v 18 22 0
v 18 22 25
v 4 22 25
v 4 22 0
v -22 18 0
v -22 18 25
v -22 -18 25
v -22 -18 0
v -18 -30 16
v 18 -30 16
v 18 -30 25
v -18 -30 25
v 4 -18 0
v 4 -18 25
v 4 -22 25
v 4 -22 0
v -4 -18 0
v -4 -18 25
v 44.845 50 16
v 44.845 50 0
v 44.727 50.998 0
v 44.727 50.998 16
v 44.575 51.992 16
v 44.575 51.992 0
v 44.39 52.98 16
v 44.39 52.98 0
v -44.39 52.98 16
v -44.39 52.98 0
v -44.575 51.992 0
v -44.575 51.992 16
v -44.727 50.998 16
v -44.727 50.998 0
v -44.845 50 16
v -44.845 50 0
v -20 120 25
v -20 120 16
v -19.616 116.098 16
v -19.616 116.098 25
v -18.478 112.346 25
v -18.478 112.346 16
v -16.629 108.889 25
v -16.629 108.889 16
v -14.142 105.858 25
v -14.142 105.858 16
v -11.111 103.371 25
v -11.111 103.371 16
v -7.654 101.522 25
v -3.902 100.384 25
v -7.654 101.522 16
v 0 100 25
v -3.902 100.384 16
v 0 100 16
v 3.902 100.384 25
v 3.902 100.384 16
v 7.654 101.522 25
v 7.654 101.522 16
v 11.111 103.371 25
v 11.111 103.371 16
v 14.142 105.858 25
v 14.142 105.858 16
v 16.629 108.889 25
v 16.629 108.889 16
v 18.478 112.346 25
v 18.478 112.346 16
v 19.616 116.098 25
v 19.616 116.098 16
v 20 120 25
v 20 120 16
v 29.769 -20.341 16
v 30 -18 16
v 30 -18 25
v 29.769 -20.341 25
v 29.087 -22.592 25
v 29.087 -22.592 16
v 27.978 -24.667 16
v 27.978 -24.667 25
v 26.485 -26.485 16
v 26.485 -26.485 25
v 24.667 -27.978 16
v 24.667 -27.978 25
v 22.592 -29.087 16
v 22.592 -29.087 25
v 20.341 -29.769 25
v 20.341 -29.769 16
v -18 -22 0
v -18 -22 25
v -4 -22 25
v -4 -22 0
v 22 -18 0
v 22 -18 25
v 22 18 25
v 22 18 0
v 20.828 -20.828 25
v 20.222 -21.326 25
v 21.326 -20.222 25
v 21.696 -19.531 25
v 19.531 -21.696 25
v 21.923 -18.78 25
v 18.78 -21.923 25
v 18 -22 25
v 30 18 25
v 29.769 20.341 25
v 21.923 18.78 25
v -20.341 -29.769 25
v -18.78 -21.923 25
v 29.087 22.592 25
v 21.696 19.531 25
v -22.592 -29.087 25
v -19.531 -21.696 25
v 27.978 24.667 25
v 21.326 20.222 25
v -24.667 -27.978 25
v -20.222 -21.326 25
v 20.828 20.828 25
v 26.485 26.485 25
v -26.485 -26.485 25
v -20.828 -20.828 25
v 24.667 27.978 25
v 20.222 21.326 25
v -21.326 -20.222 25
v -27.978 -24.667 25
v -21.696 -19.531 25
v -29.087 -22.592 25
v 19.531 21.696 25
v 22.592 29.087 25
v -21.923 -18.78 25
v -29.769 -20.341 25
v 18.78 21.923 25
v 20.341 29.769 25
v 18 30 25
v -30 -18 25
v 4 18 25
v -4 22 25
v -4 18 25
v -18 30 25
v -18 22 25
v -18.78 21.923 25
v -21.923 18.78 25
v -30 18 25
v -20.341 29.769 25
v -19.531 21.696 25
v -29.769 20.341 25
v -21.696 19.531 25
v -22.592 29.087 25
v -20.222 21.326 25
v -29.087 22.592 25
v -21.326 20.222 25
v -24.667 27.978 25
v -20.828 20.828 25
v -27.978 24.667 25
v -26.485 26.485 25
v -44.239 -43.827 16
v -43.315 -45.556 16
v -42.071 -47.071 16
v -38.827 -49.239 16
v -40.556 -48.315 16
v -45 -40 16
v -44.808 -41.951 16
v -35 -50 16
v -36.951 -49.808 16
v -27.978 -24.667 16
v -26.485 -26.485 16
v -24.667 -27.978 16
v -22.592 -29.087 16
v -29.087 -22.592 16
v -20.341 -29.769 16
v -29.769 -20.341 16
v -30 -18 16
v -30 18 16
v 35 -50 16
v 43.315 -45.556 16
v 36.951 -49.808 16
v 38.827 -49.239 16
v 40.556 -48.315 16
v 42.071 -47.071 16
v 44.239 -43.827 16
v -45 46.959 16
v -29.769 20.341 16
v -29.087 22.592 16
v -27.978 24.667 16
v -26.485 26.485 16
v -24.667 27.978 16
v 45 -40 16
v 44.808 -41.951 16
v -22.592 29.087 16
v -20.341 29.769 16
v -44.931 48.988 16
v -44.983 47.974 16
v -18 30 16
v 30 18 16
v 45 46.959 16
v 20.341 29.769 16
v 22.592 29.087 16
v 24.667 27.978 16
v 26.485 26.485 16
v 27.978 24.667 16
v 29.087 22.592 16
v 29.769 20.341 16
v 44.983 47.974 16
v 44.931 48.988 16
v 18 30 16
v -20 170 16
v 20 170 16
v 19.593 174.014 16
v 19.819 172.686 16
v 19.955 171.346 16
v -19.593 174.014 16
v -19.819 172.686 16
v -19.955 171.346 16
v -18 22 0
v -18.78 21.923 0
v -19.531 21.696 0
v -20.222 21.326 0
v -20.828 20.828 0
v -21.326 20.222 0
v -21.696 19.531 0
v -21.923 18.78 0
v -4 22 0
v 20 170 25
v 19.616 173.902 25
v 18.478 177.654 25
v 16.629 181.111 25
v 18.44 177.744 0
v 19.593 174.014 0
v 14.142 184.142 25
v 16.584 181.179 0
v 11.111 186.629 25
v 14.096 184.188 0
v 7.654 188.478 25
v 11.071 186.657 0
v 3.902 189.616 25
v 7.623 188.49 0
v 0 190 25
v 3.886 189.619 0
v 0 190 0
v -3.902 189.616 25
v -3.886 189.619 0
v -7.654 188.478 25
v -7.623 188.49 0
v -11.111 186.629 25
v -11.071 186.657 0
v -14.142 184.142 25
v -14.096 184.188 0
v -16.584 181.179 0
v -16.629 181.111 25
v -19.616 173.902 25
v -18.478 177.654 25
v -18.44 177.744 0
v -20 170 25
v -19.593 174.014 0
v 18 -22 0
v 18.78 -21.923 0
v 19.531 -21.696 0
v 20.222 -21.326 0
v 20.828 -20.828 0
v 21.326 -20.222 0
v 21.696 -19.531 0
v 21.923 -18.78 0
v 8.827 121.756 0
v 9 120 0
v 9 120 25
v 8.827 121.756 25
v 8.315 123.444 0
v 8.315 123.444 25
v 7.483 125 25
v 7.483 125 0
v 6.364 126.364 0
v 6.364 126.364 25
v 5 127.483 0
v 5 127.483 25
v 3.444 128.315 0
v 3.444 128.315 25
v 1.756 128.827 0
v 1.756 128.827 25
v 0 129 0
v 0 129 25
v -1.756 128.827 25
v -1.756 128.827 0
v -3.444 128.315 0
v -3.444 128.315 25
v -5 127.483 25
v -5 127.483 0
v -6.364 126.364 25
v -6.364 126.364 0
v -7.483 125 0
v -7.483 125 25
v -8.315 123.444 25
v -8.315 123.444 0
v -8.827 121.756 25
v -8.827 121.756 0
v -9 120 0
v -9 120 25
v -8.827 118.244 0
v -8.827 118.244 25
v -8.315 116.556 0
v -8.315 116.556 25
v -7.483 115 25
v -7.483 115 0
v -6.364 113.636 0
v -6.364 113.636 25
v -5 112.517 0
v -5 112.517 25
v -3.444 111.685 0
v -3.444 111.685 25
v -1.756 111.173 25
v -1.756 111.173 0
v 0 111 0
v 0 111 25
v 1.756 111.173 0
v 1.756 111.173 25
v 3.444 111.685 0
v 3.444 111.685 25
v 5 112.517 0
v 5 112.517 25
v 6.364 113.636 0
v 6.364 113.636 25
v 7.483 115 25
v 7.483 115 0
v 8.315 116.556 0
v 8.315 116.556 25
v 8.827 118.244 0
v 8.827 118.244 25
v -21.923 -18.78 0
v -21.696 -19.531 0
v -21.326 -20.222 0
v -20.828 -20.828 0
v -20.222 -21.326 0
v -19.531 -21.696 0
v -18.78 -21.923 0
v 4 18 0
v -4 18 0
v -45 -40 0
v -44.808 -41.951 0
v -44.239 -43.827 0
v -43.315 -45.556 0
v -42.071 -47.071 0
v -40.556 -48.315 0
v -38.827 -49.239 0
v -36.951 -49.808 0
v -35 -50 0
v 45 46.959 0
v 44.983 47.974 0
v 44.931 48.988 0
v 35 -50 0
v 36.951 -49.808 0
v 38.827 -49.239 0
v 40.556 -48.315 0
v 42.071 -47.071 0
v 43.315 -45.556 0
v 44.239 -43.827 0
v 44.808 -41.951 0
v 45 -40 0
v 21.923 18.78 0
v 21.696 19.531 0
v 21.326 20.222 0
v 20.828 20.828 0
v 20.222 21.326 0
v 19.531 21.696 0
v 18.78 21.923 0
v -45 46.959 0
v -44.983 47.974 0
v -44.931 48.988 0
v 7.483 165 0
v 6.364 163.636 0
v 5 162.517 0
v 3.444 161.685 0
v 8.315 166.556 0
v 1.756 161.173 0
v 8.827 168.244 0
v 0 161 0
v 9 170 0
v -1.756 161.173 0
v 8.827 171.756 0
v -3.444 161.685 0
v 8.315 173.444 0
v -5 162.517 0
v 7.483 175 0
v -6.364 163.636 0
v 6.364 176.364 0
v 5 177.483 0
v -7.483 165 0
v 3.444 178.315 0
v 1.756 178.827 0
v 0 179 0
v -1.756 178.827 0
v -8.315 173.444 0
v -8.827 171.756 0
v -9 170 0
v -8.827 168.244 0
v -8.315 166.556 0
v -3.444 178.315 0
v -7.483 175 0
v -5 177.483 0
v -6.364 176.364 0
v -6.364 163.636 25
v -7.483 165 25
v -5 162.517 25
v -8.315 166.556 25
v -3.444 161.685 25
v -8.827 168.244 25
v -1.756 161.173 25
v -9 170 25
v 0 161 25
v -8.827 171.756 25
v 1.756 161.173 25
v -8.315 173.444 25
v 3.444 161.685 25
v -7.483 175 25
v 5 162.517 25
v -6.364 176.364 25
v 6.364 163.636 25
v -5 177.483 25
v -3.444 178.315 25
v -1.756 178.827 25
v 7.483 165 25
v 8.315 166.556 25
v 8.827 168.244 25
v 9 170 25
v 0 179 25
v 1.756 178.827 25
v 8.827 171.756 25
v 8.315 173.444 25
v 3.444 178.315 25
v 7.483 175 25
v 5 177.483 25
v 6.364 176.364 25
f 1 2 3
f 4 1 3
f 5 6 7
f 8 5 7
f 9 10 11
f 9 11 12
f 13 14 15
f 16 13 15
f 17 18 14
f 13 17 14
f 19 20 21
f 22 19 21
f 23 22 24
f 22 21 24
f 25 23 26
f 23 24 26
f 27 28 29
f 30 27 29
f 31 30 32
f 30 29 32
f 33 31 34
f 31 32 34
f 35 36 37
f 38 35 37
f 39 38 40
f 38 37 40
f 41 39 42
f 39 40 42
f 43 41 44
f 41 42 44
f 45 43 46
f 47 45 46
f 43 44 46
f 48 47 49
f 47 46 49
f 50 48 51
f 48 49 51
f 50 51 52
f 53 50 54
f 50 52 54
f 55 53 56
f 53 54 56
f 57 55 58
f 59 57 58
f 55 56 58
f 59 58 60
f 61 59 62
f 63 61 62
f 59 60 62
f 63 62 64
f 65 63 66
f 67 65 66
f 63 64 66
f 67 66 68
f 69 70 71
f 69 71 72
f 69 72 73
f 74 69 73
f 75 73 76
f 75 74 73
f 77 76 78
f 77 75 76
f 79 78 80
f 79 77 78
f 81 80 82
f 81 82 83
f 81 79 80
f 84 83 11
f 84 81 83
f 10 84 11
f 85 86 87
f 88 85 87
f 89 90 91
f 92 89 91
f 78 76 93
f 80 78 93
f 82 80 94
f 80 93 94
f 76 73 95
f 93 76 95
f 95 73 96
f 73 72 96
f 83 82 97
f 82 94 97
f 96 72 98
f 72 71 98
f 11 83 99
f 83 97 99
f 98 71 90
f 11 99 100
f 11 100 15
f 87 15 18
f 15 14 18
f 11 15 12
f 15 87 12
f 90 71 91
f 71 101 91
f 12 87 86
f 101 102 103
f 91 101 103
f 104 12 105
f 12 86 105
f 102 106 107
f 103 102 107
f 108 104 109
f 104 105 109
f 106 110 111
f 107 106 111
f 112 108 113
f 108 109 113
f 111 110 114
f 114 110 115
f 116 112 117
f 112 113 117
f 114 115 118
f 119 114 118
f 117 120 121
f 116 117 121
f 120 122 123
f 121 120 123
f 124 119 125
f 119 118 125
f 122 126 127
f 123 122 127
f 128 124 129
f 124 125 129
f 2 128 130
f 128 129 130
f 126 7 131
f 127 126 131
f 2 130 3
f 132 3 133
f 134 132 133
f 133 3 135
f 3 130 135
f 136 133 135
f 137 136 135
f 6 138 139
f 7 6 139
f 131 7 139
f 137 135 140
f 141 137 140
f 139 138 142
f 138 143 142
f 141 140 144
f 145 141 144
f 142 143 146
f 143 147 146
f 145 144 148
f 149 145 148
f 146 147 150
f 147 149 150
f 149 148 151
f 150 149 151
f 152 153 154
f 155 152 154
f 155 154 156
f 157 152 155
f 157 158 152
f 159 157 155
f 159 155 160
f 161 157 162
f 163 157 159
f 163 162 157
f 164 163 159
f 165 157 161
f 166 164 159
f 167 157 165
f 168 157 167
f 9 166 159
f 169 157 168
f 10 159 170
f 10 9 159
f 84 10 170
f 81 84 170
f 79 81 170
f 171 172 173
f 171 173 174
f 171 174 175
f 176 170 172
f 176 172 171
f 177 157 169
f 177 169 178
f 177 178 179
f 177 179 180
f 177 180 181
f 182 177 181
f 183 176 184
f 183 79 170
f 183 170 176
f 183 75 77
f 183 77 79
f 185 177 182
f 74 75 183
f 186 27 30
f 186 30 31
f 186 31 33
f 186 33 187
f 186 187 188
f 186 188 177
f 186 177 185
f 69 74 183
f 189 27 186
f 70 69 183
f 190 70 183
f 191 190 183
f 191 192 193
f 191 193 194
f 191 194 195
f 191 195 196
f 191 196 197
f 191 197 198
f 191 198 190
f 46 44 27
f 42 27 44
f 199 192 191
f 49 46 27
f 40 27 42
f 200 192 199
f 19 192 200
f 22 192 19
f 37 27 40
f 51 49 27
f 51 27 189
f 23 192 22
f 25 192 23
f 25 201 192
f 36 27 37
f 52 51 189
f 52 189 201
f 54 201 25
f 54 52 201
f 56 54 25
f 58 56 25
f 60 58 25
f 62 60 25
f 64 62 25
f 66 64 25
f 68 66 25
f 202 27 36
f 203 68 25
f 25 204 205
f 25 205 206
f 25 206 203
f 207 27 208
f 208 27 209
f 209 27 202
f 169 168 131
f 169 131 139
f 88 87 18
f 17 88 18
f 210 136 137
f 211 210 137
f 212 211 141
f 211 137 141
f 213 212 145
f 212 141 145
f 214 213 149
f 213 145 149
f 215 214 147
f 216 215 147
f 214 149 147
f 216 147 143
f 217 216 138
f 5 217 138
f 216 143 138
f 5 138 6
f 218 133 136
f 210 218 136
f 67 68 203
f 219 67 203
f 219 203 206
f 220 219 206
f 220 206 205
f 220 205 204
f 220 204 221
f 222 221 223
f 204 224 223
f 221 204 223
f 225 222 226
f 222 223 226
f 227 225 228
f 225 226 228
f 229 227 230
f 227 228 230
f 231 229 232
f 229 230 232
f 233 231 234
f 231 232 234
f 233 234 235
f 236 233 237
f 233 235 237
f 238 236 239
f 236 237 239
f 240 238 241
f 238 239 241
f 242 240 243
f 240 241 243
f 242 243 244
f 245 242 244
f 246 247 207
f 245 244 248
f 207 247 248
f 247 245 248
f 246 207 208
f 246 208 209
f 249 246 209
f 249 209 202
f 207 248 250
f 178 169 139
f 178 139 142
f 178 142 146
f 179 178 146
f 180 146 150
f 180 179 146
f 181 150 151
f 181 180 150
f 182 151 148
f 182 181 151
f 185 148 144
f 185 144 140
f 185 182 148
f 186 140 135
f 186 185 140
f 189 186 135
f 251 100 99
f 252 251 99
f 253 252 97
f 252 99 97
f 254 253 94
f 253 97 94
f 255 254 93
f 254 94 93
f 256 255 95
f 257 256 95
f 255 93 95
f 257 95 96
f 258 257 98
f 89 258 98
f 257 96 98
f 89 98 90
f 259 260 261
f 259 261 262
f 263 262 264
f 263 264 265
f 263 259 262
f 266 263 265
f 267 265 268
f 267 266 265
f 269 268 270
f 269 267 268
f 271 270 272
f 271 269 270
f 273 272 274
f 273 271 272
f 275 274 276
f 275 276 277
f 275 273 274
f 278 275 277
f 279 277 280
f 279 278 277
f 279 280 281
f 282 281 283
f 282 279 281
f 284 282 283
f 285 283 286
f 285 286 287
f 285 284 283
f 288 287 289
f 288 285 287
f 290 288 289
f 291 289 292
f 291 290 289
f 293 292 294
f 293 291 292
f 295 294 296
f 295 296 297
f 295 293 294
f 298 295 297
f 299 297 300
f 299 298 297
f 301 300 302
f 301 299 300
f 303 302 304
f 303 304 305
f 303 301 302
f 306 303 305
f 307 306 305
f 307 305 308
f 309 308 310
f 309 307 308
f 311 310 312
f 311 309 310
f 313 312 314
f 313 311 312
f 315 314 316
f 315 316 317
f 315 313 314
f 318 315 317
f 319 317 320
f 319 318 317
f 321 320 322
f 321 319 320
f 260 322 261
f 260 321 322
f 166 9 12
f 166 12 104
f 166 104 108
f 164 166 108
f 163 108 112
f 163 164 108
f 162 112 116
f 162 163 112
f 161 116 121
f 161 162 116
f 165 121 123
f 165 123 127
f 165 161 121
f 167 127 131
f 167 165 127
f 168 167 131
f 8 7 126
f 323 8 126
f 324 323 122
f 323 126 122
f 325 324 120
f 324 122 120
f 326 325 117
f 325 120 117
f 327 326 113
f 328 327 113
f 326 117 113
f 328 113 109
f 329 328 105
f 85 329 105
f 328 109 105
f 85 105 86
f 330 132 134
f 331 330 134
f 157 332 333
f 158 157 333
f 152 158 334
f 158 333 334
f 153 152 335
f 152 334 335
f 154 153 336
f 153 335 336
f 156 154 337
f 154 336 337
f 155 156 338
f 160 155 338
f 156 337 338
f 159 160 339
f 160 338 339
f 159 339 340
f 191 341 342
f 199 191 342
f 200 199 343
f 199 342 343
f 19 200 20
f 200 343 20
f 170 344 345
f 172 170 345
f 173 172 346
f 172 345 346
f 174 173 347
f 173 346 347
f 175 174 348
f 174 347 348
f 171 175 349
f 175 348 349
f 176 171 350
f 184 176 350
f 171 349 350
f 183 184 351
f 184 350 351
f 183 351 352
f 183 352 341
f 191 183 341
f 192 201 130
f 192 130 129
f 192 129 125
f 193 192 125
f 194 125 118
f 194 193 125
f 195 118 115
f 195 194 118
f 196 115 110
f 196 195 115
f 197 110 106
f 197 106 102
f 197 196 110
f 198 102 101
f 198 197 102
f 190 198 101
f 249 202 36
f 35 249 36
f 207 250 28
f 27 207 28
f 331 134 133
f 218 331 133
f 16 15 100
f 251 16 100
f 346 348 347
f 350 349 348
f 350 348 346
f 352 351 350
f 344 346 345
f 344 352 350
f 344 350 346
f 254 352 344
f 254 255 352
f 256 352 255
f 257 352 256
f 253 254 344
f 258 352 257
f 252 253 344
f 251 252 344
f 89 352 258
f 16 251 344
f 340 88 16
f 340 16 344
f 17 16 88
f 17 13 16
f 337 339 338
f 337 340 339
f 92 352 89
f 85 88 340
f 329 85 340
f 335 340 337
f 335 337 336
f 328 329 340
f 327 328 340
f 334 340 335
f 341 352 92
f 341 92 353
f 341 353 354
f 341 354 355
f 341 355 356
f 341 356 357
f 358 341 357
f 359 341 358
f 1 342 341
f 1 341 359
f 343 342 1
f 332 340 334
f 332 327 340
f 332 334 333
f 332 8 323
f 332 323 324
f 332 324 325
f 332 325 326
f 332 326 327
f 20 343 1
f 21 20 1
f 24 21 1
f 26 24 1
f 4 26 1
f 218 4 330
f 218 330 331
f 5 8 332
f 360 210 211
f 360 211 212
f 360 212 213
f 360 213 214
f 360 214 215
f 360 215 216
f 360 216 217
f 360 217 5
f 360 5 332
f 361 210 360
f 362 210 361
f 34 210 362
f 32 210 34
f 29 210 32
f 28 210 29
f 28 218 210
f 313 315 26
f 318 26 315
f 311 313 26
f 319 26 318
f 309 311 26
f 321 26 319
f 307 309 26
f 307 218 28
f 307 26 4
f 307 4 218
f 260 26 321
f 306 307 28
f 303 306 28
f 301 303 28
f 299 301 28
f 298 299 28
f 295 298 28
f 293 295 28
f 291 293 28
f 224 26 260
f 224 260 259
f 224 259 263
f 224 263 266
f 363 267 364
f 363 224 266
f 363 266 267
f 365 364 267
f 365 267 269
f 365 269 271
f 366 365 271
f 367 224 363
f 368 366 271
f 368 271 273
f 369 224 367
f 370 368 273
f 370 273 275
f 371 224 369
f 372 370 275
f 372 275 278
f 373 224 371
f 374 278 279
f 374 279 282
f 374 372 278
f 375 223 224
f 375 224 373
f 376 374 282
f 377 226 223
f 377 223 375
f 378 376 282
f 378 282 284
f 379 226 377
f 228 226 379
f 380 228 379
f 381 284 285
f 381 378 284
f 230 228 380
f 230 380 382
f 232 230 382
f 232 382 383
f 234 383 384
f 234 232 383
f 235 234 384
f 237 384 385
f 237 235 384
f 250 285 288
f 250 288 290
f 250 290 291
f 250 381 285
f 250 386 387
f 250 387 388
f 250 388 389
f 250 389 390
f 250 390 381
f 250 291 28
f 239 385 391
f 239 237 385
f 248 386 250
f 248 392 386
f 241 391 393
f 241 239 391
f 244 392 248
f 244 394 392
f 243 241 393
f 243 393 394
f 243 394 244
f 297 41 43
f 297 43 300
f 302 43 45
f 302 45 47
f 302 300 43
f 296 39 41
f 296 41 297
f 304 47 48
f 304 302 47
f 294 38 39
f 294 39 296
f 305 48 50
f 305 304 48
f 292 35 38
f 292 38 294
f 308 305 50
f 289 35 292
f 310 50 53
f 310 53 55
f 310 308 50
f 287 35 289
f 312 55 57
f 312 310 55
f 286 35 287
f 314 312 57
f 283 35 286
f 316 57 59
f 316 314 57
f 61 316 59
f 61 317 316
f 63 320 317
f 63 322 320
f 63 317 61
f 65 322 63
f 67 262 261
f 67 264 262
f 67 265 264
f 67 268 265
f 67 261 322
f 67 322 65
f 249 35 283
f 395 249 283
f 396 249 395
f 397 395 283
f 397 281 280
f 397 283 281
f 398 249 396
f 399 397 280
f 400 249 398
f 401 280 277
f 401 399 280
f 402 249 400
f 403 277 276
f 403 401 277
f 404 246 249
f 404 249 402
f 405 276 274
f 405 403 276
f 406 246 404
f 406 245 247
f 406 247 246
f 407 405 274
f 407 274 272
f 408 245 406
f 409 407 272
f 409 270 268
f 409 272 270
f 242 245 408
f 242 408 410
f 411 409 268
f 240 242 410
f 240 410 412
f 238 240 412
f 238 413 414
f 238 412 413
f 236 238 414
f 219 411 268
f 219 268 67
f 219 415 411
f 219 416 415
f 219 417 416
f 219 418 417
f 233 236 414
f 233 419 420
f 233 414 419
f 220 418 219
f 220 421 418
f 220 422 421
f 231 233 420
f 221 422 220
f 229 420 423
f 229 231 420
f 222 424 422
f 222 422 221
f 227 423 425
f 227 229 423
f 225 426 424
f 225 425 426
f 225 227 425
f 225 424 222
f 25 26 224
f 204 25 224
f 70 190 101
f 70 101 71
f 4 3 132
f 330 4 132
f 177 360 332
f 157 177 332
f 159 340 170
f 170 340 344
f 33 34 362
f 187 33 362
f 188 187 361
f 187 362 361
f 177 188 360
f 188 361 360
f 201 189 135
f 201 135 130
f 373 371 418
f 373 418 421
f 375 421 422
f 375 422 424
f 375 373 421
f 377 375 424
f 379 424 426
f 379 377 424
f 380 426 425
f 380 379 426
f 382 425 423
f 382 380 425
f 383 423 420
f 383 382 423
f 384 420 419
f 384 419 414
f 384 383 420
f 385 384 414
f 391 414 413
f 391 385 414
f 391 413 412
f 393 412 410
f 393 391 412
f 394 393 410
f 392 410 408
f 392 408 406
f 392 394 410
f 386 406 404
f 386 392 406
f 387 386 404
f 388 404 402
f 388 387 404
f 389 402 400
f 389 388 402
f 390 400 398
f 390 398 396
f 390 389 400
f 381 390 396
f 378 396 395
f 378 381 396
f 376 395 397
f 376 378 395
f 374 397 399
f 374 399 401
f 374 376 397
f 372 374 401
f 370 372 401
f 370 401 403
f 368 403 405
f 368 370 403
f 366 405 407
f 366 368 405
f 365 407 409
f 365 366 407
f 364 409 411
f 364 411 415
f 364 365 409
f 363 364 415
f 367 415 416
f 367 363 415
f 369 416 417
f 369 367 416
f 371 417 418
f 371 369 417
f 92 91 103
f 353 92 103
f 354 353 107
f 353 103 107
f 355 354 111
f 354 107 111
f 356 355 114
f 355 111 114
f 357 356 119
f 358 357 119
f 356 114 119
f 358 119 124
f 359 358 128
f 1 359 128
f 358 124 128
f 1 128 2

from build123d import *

# Parameters (mm, degrees)
EXTRUDE_1_DEPTH     = 16
SKETCH_1_3_R        = 9
EXTRUDE_2_DEPTH     = 25
EXTRUDE_3_DEPTH     = 25
CUT_EXTRUDE_1_DEPTH = 25


with BuildPart() as part:
    # 草图1 → 凸台-拉伸1 (new body)
    with BuildSketch(Plane.XY):
        with BuildLine():
            Line((-35, -50), (35, -50))
            ThreePointArc((35, -50), (42.071067812, -47.071067812), (45, -40))
            Line((45, -40), (45, 46.958512764))
            ThreePointArc((45, 46.958512764), (44.847001034, 49.98448852), (44.389564715, 52.979599532))
            Line((44.389564715, 52.979599532), (19.593043195, 174.014057595))
            ThreePointArc((19.593043195, 174.014057595), (19.898000702, 172.017317043), (20, 170))
            Line((20, 170), (20, 120))
            ThreePointArc((20, 120), (0, 100), (-20, 120))
            Line((-20, 120), (-20, 170))
            ThreePointArc((-20, 170), (-19.898000688, 172.017317185), (-19.593043138, 174.014057873))
            Line((-19.593043138, 174.014057873), (-44.389564715, 52.979599532))
            ThreePointArc((-44.389564715, 52.979599532), (-44.847001034, 49.98448852), (-45, 46.958512764))
            Line((-45, 46.958512764), (-45, -40))
            ThreePointArc((-45, -40), (-42.071067812, -47.071067812), (-35, -50))
        make_face()
    extrude(amount=EXTRUDE_1_DEPTH)

    # 草图1<3> → 凸台-拉伸2 (add)
    with BuildSketch(Plane.XY):
        with BuildLine():
            ThreePointArc((20, 170), (19.898000702, 172.017317043), (19.593043195, 174.014057595))
            ThreePointArc((19.593043195, 174.014057595), (1.42e-07, 190), (-19.593043138, 174.014057873))
            ThreePointArc((-19.593043138, 174.014057873), (-19.898000688, 172.017317185), (-20, 170))
            Line((-20, 170), (-20, 120))
            ThreePointArc((-20, 120), (0, 100), (20, 120))
            Line((20, 120), (20, 170))
        make_face()
        with Locations((0, 120)):
            Circle(SKETCH_1_3_R, mode=Mode.SUBTRACT)
        with Locations((0, 170)):
            Circle(SKETCH_1_3_R, mode=Mode.SUBTRACT)
    extrude(amount=EXTRUDE_2_DEPTH)

    # 草图2 → 凸台-拉伸3 (add)
    with BuildSketch(Plane.XY):
        with BuildLine():
            Line((18, -30), (-18, -30))
            ThreePointArc((-18, -30), (-26.485281374, -26.485281374), (-30, -18))
            Line((-30, -18), (-30, 18))
            ThreePointArc((-30, 18), (-26.485281374, 26.485281374), (-18, 30))
            Line((-18, 30), (18, 30))
            ThreePointArc((18, 30), (26.485281374, 26.485281374), (30, 18))
            Line((30, 18), (30, -18))
            ThreePointArc((30, -18), (26.485281374, -26.485281374), (18, -30))
        make_face()
    extrude(amount=EXTRUDE_3_DEPTH)

    # 草图3 → 切除-拉伸1 (cut)
    with BuildSketch(Plane.XY.offset(25)):
        with BuildLine():
            Line((-4, 22), (-18, 22))
            ThreePointArc((-18, 22), (-20.828427125, 20.828427125), (-22, 18))
            Line((-22, 18), (-22, -18))
            ThreePointArc((-22, -18), (-20.828427125, -20.828427125), (-18, -22))
            Line((-18, -22), (-4, -22))
            Line((-4, -22), (-4, -18))
            Line((-4, -18), (4, -18))
            Line((4, -18), (4, -22))
            Line((4, -22), (18, -22))
            ThreePointArc((18, -22), (20.828427125, -20.828427125), (22, -18))
            Line((22, -18), (22, 18))
            ThreePointArc((22, 18), (20.828427125, 20.828427125), (18, 22))
            Line((18, 22), (4, 22))
            Line((4, 22), (4, 18))
            Line((4, 18), (-4, 18))
            Line((-4, 18), (-4, 22))
        make_face()
    extrude(amount=-CUT_EXTRUDE_1_DEPTH, mode=Mode.SUBTRACT)


solid = part.part
